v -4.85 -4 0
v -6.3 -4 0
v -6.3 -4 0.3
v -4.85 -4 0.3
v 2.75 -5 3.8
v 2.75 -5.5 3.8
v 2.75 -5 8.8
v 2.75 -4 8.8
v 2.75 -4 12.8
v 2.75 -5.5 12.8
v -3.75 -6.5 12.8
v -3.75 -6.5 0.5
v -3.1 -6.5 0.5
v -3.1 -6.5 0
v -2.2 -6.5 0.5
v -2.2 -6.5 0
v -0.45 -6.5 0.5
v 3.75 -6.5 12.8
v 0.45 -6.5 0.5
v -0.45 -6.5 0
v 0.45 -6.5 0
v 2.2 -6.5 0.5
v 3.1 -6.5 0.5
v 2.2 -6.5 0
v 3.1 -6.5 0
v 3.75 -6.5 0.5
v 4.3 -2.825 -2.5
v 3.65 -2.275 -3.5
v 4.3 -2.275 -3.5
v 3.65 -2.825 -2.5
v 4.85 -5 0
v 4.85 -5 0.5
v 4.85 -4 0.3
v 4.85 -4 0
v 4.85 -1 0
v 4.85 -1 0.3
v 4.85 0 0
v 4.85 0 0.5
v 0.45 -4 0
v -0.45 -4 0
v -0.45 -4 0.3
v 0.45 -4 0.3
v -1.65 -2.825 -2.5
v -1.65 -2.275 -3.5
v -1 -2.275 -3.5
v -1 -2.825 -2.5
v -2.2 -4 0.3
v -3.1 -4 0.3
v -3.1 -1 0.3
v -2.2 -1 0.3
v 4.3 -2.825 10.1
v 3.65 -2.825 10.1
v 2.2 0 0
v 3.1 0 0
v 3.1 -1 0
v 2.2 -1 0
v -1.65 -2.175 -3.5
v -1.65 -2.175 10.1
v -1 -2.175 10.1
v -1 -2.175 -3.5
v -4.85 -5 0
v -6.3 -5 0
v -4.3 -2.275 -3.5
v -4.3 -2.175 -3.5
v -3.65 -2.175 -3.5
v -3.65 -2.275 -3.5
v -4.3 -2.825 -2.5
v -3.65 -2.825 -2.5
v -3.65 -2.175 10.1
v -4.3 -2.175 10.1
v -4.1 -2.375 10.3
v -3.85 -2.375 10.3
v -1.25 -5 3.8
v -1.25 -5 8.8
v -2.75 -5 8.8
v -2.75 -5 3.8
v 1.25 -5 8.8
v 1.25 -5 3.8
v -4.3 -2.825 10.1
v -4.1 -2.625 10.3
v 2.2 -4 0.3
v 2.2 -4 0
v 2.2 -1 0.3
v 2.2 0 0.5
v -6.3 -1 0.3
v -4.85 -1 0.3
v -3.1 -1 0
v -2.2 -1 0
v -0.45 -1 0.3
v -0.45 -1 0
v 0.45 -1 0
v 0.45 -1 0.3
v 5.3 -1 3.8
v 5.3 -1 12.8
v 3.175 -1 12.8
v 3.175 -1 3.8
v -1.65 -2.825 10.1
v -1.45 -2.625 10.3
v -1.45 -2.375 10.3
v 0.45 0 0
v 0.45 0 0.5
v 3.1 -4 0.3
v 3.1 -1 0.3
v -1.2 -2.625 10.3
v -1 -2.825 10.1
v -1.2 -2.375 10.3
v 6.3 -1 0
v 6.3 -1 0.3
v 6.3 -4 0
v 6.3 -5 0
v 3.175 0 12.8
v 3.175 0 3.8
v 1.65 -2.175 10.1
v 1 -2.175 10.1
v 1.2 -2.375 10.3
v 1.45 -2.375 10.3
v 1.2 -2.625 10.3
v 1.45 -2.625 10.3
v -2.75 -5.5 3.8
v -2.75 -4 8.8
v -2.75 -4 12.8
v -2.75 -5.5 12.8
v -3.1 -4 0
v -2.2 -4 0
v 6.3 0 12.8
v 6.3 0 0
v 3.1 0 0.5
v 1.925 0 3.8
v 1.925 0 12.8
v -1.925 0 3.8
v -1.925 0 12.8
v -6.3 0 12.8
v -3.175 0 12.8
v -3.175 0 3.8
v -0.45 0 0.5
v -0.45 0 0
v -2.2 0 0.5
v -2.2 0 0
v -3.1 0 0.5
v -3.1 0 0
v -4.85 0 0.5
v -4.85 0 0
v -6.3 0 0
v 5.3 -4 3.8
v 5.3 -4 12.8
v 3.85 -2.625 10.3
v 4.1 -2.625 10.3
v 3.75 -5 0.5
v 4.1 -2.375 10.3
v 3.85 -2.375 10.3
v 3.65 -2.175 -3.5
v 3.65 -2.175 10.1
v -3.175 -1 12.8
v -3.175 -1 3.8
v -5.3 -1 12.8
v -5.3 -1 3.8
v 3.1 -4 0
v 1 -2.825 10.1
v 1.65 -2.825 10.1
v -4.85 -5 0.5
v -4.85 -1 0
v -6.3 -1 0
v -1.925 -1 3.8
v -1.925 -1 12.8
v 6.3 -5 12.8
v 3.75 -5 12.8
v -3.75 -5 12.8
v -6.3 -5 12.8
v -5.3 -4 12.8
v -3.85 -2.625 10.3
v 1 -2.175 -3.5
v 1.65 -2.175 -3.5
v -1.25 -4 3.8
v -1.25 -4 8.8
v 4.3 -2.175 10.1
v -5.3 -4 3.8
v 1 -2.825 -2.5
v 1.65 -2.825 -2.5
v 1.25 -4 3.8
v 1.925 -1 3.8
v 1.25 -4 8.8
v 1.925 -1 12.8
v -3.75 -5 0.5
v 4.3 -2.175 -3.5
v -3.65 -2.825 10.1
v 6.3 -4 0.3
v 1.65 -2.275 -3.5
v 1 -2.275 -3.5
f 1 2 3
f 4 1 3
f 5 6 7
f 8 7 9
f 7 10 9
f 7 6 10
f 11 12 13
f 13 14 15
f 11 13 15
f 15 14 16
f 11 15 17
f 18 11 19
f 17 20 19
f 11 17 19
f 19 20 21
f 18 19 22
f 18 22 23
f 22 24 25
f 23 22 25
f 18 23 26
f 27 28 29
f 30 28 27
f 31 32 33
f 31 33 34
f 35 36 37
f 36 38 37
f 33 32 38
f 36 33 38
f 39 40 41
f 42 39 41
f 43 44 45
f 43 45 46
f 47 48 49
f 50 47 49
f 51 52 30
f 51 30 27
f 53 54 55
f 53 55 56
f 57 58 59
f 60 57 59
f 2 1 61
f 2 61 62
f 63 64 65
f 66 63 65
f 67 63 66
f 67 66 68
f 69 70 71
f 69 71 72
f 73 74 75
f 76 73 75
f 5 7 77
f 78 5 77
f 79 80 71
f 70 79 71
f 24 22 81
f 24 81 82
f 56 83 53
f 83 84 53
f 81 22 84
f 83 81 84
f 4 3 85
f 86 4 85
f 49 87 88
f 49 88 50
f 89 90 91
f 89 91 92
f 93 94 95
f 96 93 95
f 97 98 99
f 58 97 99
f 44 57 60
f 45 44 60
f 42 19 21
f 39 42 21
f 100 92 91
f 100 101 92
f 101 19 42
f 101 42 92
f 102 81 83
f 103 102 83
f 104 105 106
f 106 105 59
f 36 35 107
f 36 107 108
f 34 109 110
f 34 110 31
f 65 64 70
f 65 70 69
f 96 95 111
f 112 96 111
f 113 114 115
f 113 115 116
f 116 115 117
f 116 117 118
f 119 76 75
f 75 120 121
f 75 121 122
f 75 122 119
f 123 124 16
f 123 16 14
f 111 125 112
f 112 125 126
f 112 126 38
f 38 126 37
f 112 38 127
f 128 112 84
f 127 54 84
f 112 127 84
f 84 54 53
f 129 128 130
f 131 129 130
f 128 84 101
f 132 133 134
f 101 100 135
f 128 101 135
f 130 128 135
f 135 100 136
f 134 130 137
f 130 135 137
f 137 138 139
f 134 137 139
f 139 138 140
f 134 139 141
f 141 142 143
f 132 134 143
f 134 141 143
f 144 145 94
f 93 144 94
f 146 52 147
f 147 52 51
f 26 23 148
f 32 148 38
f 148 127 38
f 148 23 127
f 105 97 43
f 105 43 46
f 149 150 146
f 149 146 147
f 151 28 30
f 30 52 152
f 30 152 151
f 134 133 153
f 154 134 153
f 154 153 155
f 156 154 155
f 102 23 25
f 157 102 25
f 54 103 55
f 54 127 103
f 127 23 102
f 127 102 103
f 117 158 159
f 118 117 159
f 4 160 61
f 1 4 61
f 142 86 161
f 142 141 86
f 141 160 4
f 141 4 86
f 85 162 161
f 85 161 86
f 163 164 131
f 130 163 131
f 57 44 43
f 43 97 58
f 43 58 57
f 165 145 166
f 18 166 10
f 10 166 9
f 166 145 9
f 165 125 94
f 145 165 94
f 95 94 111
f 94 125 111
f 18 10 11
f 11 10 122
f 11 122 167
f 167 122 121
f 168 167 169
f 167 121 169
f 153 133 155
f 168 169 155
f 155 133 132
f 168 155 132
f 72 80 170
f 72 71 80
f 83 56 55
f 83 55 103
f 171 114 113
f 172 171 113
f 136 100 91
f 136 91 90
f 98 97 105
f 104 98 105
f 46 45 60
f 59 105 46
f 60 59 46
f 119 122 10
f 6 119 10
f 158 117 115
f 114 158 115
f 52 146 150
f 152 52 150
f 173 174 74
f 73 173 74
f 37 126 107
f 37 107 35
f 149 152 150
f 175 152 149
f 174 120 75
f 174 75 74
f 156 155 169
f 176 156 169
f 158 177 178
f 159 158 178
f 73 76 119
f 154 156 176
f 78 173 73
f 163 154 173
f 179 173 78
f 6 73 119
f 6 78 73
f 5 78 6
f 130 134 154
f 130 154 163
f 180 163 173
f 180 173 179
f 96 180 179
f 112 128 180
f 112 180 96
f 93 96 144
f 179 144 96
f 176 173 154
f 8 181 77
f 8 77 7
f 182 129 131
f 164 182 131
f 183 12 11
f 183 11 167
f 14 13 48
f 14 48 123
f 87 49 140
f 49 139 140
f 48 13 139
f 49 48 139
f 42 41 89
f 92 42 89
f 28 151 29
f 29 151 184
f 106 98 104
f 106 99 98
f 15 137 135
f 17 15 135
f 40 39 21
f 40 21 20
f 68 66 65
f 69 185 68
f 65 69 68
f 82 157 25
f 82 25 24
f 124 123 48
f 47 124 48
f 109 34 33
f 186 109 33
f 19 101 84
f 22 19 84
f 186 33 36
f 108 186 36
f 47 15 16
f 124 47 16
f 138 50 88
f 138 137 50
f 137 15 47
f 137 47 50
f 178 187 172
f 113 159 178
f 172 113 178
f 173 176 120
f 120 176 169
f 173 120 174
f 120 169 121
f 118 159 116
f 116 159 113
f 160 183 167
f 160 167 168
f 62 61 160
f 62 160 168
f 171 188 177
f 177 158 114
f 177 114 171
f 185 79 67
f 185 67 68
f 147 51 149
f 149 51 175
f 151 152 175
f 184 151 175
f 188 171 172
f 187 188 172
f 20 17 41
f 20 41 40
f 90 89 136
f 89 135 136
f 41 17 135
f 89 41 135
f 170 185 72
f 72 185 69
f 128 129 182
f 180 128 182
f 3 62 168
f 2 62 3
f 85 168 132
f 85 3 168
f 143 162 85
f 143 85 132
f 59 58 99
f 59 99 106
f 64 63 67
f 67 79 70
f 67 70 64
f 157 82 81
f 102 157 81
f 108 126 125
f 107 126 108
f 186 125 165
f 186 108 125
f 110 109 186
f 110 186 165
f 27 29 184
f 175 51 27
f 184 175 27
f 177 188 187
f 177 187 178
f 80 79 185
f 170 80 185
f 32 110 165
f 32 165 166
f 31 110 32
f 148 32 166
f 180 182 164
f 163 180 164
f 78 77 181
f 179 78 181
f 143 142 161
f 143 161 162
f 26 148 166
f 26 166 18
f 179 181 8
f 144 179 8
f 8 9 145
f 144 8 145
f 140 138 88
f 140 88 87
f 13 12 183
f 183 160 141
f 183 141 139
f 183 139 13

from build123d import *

# Parameters (mm, degrees)
BOSS_EXTRUDE1_DEPTH   = 12.8
CUT_EXTRUDE2_DEPTH    = 9
SKETCH5_W             = 1.5
SKETCH5_H             = 1
CUT_EXTRUDE3_DEPTH    = 4
SKETCH6_W             = 0.65
SKETCH6_H             = 0.65
BOSS_EXTRUDE3_DEPTH   = 13.8
BOSS_EXTRUDE3_2_DEPTH = 13.8
BOSS_EXTRUDE3_3_DEPTH = 13.8
BOSS_EXTRUDE3_4_DEPTH = 13.8
SKETCH7_W             = 1.75
SKETCH7_H             = 0.5
CUT_EXTRUDE5_DEPTH    = 7.5
SKETCH8_W             = 0.3
SKETCH8_H             = 3
CUT_EXTRUDE6_DEPTH    = 13.6
CUT_EXTRUDE7_DEPTH    = 11.6
CHAMFER1_SIZE         = 0.2
CHAMFER2_SIZE         = 0.2
CHAMFER3_SIZE         = 0.2
CHAMFER4_SIZE         = 0.2


with BuildPart() as part:
    # Sketch1 → Boss-Extrude1 (new body)
    with BuildSketch(Plane.XY):
        Polygon((0, 0), (6.3, 0), (6.3, -5), (3.75, -5), (3.75, -6.5), (0, -6.5), (-3.75, -6.5), (-3.75, -5), (-6.3, -5), (-6.3, 0), align=None)
    extrude(amount=BOSS_EXTRUDE1_DEPTH)

    # Sketch4 → Cut-Extrude2 (cut)
    with BuildSketch(Plane.XY.offset(12.8)):
        Polygon((-2.75, -4), (-1.25, -4), (-1.25, -5), (-2.75, -5), (-2.75, -5.5), (2.75, -5.5), (2.75, -5), (1.25, -5), (1.25, -4), (2.75, -4), (5.3, -4), (5.3, -1), (3.175, -1), (3.175, 0), (1.925, 0), (1.925, -1), (-1.925, -1), (-1.925, 0), (-3.175, 0), (-3.175, -1), (-5.3, -1), (-5.3, -4), align=None)
    extrude(amount=-CUT_EXTRUDE2_DEPTH, mode=Mode.SUBTRACT)

    # Sketch5 → Cut-Extrude3 (cut)
    with BuildSketch(Plane.XY.offset(12.8)):
        with Locations((-2, -4.5)):
            Rectangle(SKETCH5_W, SKETCH5_H)
        with Locations((2, -4.5)):
            Rectangle(SKETCH5_W, SKETCH5_H)
    extrude(amount=-CUT_EXTRUDE3_DEPTH, mode=Mode.SUBTRACT)

    # Sketch7 → Cut-Extrude5 (cut, through all)
    with BuildSketch(Plane(origin=(0, 0, 0), x_dir=(1, 0, 0), z_dir=(0, 1, 0))):
        with Locations((-3.975, -0.25)):
            Rectangle(SKETCH7_W, SKETCH7_H)
        with Locations((-1.325, -0.25)):
            Rectangle(SKETCH7_W, SKETCH7_H)
        with Locations((1.325, -0.25)):
            Rectangle(SKETCH7_W, SKETCH7_H)
        with Locations((3.975, -0.25)):
            Rectangle(SKETCH7_W, SKETCH7_H)
    extrude(amount=-CUT_EXTRUDE5_DEPTH, mode=Mode.SUBTRACT)

    # Sketch8 → Cut-Extrude6 (cut, through all)
    with BuildSketch(Plane.ZY.offset(6.3)):
        with Locations((0.15, -2.5)):
            Rectangle(SKETCH8_W, SKETCH8_H)
    extrude(amount=-CUT_EXTRUDE6_DEPTH, mode=Mode.SUBTRACT)


with BuildPart() as body_2:
    # Sketch6 → Boss-Extrude3 (new body)
    with BuildSketch(Plane.XY.offset(10.3)):
        with Locations((1.325, -2.5)):
            Rectangle(SKETCH6_W, SKETCH6_H)
    extrude(amount=-BOSS_EXTRUDE3_DEPTH)


with BuildPart() as body_3:
    # Sketch6 → Boss-Extrude3 2 (new body)
    with BuildSketch(Plane.XY.offset(10.3)):
        with Locations((3.975, -2.5)):
            Rectangle(SKETCH6_W, SKETCH6_H)
    extrude(amount=-BOSS_EXTRUDE3_2_DEPTH)


with BuildPart() as body_4:
    # Sketch6 → Boss-Extrude3 3 (new body)
    with BuildSketch(Plane.XY.offset(10.3)):
        with Locations((-3.975, -2.5)):
            Rectangle(SKETCH6_W, SKETCH6_H)
    extrude(amount=-BOSS_EXTRUDE3_3_DEPTH)


with BuildPart() as body_5:
    # Sketch6 → Boss-Extrude3 4 (new body)
    with BuildSketch(Plane.XY.offset(10.3)):
        with Locations((-1.325, -2.5)):
            Rectangle(SKETCH6_W, SKETCH6_H)
    extrude(amount=-BOSS_EXTRUDE3_4_DEPTH)


with BuildPart() as cut_extrude7_tool:
    # Sketch9 → Cut-Extrude7 (new body, through all)
    with BuildSketch(Plane.ZY.offset(4.3)):
        Polygon((-3.5, -2.275), (-2.5, -2.825), (-3.5, -2.825), align=None)
    extrude(amount=-CUT_EXTRUDE7_DEPTH)


with BuildPart() as body_2_1:
    add(body_2.part)

    # Cut-Extrude7: cut by cut_extrude7_tool
    add(cut_extrude7_tool.part, mode=Mode.SUBTRACT)

    # Chamfer3
    chamfer3_edges = [body_2_1.edges().sort_by_distance(p)[0] for p in [
        (1.325, -2.175, 10.3),
        (1.65, -2.5, 10.3),
        (1.325, -2.825, 10.3),
        (1, -2.5, 10.3),
    ]]
    chamfer(chamfer3_edges, length=CHAMFER3_SIZE)


with BuildPart() as body_3_1:
    add(body_3.part)

    # Cut-Extrude7: cut by cut_extrude7_tool
    add(cut_extrude7_tool.part, mode=Mode.SUBTRACT)

    # Chamfer4
    chamfer4_edges = [body_3_1.edges().sort_by_distance(p)[0] for p in [
        (3.975, -2.175, 10.3),
        (4.3, -2.5, 10.3),
        (3.975, -2.825, 10.3),
        (3.65, -2.5, 10.3),
    ]]
    chamfer(chamfer4_edges, length=CHAMFER4_SIZE)


with BuildPart() as body_4_1:
    add(body_4.part)

    # Cut-Extrude7: cut by cut_extrude7_tool
    add(cut_extrude7_tool.part, mode=Mode.SUBTRACT)

    # Chamfer2
    chamfer2_edges = [body_4_1.edges().sort_by_distance(p)[0] for p in [
        (-3.975, -2.825, 10.3),
        (-4.3, -2.5, 10.3),
        (-3.975, -2.175, 10.3),
        (-3.65, -2.5, 10.3),
    ]]
    chamfer(chamfer2_edges, length=CHAMFER2_SIZE)


with BuildPart() as body_5_1:
    add(body_5.part)

    # Cut-Extrude7: cut by cut_extrude7_tool
    add(cut_extrude7_tool.part, mode=Mode.SUBTRACT)

    # Chamfer1
    chamfer1_edges = [body_5_1.edges().sort_by_distance(p)[0] for p in [
        (-1.325, -2.825, 10.3),
        (-1.65, -2.5, 10.3),
        (-1.325, -2.175, 10.3),
        (-1, -2.5, 10.3),
    ]]
    chamfer(chamfer1_edges, length=CHAMFER1_SIZE)


solid = Compound([part.part, body_2_1.part, body_3_1.part, body_4_1.part, body_5_1.part])
